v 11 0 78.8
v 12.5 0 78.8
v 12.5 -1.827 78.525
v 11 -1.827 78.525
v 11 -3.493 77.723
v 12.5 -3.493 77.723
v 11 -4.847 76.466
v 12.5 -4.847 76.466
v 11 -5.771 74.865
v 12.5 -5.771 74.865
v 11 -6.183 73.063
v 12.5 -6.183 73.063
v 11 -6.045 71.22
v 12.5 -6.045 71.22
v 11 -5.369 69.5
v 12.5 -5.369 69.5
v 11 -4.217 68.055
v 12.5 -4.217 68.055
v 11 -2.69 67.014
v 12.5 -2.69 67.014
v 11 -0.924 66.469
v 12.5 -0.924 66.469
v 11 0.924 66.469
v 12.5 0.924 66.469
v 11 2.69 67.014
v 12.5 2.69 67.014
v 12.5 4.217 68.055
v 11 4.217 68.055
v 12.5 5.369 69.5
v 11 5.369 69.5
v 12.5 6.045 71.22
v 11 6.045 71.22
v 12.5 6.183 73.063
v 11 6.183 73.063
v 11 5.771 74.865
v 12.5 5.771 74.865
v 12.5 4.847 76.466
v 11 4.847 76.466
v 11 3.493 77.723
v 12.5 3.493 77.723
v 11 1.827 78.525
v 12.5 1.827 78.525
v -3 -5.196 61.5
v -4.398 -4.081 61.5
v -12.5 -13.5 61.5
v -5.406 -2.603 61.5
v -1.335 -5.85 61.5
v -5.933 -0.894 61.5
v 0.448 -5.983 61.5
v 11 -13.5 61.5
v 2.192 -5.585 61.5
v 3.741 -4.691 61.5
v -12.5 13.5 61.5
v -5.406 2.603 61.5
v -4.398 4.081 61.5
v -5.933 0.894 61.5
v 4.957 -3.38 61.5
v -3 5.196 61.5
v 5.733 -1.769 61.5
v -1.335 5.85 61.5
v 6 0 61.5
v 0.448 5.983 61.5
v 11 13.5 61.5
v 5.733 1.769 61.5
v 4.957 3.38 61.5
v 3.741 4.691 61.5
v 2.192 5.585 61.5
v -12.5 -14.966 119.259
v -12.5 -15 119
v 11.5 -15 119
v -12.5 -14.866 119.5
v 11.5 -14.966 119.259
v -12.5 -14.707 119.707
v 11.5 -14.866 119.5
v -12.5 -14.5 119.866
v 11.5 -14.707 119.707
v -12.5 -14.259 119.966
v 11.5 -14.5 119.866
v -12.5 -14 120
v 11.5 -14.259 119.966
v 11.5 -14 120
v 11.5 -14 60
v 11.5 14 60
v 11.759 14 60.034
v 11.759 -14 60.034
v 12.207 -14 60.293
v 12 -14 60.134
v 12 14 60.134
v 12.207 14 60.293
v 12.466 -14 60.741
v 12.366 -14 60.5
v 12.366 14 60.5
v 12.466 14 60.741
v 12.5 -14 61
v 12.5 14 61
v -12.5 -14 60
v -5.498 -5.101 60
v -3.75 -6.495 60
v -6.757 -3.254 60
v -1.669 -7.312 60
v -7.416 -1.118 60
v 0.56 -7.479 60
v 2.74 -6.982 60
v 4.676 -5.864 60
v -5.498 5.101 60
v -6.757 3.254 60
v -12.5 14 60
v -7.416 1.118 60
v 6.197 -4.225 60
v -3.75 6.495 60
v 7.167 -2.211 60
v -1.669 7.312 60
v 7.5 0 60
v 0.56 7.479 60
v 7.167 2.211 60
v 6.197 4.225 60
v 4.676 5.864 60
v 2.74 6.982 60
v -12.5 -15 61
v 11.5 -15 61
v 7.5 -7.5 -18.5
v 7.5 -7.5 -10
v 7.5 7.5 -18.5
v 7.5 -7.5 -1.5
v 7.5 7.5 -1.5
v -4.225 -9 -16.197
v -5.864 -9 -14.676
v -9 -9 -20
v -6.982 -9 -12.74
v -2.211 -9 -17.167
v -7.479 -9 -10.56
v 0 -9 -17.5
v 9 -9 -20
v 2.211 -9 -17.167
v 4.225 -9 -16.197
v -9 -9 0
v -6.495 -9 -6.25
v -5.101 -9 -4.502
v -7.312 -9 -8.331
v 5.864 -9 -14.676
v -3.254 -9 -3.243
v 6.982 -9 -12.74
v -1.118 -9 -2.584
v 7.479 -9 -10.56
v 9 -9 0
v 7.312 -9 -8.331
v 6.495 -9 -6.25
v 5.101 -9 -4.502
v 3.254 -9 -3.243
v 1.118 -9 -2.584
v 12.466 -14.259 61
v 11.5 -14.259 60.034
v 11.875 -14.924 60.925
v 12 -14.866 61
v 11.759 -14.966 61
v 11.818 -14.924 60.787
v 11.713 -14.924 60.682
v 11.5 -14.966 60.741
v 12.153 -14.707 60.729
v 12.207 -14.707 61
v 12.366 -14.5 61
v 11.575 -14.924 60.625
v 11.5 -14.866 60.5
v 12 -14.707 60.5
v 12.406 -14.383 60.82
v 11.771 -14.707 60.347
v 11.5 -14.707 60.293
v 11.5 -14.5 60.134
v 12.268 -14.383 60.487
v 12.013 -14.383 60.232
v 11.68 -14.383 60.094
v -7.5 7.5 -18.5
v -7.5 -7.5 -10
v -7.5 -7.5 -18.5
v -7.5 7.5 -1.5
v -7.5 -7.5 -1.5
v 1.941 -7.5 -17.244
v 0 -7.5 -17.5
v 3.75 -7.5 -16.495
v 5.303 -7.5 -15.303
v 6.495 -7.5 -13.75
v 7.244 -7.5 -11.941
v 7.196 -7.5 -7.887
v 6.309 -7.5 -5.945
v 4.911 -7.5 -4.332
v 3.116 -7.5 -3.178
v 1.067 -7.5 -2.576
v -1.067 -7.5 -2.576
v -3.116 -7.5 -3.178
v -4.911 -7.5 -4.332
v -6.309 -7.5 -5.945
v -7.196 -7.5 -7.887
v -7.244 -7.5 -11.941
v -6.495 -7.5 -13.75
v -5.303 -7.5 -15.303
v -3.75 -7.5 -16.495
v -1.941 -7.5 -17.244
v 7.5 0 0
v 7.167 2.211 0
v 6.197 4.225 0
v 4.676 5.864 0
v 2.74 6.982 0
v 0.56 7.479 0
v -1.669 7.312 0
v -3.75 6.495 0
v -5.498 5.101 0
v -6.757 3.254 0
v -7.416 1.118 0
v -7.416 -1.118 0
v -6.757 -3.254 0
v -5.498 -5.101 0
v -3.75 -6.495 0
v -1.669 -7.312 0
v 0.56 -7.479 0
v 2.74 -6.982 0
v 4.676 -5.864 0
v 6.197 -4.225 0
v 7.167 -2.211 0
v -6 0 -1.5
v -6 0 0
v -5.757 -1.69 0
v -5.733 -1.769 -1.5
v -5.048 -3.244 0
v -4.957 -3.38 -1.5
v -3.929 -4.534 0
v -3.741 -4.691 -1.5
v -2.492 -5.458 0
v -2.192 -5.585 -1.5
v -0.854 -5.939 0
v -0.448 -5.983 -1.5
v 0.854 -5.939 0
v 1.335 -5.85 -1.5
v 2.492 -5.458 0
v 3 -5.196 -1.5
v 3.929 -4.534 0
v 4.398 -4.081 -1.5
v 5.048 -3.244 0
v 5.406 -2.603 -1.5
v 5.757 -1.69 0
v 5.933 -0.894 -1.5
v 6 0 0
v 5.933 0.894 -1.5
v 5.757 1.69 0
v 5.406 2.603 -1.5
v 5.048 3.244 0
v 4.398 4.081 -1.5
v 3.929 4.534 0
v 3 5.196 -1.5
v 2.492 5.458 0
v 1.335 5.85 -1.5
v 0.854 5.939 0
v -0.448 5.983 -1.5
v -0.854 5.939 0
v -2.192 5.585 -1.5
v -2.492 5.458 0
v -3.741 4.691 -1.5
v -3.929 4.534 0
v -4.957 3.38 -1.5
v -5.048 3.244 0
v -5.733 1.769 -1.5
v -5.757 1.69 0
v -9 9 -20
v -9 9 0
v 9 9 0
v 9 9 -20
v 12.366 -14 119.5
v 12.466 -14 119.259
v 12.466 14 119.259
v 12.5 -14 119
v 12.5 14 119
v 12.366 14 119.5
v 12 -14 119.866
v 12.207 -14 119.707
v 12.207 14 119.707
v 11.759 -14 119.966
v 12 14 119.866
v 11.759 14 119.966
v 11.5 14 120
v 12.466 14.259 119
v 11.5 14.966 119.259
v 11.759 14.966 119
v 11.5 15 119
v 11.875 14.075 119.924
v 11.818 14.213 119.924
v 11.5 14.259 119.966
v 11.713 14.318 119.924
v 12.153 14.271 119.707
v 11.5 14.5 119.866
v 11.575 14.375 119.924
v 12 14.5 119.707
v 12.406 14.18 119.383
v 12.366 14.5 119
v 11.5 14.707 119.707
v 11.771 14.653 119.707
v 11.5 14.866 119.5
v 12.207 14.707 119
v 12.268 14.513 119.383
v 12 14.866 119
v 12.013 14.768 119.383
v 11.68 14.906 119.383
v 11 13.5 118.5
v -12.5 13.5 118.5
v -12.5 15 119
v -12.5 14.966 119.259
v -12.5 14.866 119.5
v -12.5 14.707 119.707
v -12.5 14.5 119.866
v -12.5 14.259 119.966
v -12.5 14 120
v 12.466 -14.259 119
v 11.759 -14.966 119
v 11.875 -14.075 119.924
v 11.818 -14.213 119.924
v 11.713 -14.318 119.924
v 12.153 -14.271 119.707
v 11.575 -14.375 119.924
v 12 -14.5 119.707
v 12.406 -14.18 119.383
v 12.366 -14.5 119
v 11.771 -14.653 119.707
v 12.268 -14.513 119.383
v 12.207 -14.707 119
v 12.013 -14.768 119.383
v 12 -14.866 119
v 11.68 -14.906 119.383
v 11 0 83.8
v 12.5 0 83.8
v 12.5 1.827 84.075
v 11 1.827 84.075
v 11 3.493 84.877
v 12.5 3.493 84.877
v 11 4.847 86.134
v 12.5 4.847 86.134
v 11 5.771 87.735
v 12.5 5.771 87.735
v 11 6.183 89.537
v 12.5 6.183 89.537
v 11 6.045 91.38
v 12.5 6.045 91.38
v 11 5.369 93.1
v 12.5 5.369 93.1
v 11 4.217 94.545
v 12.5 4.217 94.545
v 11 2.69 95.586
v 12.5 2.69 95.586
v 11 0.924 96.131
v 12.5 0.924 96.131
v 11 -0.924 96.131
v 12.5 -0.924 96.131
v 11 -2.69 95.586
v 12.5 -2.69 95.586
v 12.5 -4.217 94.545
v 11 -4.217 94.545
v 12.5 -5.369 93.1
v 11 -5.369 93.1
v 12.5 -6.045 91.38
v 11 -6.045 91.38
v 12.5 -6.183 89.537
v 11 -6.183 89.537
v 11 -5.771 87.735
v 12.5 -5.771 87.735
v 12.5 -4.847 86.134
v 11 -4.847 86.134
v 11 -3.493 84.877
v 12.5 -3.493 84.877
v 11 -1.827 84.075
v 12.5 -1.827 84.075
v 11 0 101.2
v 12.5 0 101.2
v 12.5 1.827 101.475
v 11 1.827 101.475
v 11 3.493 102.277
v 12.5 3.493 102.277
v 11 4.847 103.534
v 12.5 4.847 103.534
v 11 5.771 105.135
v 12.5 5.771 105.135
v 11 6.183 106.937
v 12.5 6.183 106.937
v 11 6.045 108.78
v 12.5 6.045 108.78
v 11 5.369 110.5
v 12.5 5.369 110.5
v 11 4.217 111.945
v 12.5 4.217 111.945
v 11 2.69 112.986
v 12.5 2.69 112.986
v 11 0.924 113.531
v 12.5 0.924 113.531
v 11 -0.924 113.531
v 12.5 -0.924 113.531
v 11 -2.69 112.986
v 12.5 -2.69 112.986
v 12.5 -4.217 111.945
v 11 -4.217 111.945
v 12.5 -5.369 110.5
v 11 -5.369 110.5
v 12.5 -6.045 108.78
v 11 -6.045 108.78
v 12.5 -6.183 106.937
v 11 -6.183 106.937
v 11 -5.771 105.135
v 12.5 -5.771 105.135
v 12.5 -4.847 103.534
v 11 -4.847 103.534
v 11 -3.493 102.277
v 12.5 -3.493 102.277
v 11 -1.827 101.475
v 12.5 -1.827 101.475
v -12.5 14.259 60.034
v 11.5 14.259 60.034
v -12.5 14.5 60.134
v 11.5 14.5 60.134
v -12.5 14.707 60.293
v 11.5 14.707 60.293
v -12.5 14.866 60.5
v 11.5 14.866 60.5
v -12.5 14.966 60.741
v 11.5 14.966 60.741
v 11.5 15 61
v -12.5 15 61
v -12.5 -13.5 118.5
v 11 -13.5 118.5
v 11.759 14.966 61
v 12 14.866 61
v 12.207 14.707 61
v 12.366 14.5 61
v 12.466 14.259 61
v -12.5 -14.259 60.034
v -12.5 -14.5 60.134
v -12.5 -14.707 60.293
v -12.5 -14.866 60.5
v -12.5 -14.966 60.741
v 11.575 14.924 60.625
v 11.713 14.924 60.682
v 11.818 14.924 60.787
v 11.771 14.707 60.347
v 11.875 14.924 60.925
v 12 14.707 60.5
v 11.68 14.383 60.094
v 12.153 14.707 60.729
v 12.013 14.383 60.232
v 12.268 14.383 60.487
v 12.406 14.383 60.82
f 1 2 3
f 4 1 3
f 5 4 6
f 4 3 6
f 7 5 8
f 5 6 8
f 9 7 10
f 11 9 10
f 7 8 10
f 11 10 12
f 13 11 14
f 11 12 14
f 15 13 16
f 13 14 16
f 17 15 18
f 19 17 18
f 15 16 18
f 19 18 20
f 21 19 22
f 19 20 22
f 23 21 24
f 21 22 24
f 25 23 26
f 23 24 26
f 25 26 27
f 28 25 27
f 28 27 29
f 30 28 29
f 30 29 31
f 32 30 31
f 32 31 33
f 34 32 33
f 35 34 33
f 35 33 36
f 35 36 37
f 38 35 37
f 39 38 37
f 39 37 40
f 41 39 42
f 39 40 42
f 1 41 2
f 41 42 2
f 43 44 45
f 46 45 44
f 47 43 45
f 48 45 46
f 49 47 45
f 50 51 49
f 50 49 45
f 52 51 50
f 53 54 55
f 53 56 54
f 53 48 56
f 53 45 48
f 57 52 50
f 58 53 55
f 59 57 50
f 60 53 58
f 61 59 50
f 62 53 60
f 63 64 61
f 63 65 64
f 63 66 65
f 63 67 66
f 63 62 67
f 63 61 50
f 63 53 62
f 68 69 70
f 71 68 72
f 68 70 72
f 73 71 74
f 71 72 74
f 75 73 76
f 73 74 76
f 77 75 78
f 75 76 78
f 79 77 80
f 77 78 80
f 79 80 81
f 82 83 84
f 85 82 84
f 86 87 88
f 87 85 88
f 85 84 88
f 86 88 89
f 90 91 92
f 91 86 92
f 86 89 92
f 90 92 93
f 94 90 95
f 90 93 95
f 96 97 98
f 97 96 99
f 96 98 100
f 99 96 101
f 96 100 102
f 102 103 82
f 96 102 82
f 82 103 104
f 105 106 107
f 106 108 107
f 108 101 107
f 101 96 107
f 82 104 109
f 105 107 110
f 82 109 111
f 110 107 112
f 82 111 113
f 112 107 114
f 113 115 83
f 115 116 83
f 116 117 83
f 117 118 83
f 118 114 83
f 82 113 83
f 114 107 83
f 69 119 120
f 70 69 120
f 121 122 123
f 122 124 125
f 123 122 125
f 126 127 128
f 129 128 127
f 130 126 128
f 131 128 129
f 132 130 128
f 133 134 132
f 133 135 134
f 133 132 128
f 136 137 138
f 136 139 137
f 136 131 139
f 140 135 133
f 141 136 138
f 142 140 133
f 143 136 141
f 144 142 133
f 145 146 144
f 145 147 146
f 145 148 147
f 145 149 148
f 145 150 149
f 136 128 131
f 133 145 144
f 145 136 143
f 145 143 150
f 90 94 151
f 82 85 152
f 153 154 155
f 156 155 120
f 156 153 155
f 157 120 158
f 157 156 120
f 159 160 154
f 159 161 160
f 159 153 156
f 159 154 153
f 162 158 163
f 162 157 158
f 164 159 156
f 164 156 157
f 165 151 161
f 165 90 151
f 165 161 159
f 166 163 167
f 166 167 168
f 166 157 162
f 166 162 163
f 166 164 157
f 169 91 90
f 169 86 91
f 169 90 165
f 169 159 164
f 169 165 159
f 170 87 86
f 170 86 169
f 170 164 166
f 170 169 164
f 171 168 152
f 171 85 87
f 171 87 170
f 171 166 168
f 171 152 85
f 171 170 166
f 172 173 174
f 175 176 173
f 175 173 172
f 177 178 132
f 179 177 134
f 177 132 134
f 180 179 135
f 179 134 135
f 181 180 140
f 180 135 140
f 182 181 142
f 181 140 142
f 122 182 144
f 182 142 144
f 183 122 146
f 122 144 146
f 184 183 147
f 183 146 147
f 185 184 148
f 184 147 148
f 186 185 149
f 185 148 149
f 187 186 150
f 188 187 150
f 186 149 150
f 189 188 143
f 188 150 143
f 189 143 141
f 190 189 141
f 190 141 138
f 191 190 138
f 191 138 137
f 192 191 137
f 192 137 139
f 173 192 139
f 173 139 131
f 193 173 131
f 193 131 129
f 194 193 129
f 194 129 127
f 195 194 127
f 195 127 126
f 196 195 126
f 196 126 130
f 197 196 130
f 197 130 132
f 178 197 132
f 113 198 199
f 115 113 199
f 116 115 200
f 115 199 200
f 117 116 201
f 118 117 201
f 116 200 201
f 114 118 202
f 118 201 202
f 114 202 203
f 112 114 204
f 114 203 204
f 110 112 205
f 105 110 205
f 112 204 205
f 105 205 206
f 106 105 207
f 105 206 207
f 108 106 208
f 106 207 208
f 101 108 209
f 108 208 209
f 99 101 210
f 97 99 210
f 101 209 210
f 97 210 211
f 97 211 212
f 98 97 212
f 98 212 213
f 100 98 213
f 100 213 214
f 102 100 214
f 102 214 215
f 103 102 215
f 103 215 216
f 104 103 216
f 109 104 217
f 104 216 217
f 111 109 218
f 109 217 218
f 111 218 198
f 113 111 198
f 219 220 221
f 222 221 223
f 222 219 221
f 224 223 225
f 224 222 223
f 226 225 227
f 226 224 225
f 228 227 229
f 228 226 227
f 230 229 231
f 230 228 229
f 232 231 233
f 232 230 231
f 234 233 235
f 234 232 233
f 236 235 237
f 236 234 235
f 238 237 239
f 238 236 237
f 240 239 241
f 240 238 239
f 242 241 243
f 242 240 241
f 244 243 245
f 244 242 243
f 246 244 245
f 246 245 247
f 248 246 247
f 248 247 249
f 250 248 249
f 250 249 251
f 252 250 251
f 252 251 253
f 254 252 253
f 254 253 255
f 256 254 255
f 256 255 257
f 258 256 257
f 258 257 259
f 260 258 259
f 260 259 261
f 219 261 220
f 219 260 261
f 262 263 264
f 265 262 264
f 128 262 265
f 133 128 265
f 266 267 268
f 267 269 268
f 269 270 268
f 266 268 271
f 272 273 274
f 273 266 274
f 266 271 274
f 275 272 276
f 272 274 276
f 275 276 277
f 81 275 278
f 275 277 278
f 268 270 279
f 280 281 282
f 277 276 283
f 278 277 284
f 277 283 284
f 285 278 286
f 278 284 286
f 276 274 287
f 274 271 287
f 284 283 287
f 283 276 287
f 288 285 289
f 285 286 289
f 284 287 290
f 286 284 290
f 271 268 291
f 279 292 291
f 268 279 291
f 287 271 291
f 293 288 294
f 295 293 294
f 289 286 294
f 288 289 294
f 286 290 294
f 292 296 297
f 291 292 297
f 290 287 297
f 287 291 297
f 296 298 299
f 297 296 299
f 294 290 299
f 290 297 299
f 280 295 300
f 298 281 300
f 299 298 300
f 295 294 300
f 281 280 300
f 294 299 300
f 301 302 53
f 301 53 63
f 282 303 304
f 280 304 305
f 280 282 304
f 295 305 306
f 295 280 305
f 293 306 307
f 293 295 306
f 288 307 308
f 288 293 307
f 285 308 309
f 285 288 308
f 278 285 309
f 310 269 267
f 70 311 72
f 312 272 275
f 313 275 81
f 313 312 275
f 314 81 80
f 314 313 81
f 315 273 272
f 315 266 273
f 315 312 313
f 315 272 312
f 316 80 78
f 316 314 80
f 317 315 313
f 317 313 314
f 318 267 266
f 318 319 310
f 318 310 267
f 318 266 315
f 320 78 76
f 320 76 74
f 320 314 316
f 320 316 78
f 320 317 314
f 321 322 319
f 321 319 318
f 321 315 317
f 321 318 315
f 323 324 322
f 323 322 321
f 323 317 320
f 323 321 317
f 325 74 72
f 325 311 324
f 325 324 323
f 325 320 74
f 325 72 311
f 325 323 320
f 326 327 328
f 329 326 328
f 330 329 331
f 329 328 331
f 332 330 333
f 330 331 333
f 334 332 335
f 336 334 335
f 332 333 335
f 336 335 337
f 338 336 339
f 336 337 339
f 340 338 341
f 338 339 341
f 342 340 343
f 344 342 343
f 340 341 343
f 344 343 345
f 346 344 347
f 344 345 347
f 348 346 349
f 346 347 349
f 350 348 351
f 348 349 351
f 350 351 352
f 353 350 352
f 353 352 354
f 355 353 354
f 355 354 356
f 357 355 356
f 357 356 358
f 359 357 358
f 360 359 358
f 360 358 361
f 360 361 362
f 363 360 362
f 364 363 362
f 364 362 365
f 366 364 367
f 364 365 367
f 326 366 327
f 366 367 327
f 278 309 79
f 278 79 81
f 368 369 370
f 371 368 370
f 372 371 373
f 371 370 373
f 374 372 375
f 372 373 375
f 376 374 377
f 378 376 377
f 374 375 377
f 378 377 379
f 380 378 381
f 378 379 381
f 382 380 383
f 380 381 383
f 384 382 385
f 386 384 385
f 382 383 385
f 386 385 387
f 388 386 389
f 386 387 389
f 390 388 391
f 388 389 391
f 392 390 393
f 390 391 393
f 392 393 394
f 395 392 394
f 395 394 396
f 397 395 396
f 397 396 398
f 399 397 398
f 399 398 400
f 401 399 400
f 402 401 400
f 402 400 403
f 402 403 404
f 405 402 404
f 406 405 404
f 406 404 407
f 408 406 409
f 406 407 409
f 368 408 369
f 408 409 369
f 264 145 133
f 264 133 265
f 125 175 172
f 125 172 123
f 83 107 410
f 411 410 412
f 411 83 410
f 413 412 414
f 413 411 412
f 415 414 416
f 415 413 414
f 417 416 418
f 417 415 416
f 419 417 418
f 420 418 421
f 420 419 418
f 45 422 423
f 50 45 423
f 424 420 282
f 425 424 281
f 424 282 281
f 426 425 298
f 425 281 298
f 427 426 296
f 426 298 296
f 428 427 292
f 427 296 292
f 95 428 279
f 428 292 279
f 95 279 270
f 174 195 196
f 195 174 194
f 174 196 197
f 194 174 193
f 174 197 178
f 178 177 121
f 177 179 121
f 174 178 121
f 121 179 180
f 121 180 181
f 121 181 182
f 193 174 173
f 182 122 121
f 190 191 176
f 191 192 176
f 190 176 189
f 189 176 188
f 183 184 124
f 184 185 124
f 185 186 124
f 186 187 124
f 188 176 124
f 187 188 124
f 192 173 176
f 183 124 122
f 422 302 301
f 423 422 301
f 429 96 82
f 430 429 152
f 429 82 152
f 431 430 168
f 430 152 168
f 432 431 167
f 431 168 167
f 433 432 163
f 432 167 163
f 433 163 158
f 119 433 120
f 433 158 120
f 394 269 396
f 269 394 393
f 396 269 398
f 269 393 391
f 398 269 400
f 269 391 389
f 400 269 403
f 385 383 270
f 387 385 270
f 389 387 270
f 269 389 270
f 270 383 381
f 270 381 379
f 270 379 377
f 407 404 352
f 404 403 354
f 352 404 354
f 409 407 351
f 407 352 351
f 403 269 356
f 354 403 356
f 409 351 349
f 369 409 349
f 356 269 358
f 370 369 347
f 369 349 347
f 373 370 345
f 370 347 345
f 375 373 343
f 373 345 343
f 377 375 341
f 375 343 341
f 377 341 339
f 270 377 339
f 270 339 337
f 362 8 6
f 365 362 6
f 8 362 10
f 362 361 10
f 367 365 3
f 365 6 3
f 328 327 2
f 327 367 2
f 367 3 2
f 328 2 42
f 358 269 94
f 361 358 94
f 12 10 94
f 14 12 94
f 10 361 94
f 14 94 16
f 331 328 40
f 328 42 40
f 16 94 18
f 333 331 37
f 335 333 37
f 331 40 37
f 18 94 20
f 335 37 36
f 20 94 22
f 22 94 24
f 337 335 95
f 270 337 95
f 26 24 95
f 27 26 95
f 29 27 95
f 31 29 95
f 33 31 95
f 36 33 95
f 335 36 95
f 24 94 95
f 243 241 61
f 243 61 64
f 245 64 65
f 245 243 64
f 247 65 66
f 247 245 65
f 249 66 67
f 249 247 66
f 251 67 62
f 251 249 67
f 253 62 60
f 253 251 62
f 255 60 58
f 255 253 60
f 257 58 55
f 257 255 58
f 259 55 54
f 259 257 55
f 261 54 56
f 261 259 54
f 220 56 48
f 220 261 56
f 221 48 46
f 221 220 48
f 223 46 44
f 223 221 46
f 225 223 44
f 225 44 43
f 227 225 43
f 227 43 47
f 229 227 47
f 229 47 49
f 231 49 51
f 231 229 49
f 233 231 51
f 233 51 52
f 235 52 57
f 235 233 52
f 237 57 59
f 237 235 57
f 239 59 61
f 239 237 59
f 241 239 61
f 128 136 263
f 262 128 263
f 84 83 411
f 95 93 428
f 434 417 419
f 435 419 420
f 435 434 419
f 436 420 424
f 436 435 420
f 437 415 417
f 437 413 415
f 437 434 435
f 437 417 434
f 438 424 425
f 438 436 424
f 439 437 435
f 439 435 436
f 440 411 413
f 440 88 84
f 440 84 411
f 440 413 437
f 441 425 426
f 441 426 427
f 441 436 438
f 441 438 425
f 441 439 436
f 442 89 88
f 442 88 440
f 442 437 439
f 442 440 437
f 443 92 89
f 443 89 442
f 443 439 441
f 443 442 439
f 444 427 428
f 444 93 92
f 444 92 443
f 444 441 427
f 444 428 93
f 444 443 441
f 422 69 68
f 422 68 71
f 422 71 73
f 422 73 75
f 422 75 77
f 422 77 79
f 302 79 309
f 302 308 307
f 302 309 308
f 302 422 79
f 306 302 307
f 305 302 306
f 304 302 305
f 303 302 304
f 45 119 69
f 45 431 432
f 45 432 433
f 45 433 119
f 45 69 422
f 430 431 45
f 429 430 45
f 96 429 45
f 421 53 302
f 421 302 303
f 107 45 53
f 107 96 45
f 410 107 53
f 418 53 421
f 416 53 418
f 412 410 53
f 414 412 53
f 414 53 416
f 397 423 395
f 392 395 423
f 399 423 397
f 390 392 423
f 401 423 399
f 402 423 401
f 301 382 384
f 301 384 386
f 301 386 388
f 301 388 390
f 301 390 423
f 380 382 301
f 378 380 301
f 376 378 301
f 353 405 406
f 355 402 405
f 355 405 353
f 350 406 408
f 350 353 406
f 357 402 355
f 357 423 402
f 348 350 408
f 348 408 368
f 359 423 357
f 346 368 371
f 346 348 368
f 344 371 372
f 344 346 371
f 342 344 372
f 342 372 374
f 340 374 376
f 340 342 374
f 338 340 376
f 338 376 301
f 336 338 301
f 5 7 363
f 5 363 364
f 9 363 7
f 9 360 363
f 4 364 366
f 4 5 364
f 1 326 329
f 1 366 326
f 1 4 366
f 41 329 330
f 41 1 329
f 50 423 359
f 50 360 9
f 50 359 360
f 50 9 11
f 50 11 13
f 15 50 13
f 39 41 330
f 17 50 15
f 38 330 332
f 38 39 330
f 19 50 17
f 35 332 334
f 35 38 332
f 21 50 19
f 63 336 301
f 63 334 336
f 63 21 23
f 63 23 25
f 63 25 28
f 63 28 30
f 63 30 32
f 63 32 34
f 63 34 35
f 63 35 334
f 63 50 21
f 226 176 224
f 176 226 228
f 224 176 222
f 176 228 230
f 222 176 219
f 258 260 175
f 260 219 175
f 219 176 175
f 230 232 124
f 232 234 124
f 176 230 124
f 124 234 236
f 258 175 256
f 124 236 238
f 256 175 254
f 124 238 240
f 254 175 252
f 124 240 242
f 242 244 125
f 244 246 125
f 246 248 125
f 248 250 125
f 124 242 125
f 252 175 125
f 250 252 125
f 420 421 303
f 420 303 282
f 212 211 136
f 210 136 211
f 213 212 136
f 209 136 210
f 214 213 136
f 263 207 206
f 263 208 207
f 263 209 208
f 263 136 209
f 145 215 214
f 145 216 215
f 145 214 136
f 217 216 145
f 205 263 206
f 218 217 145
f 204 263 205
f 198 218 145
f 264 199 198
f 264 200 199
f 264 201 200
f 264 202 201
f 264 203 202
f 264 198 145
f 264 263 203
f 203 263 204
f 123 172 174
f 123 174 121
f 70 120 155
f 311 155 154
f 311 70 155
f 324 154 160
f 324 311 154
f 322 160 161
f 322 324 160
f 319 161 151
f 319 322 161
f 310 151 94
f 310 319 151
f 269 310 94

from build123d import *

# Parameters (mm, degrees)
SKETCH_1_R          = 7.5
EXTRUDE_1_DEPTH     = 60
SHELL_3_T           = -1.5
SKETCH_4_W          = 25
SKETCH_4_H          = 30
EXTRUDE_4_DEPTH     = 60
SHELL_START         = 61.5
SHELL_4_OUTLINE_W   = 23.5
SHELL_4_OUTLINE_H   = 27
SHELL_4_DEPTH       = 57
SHELL_START_2       = 60
SHELL_4_2_OUTLINE_R = 6
SHELL_4_2_DEPTH     = 1.5
SKETCH_5_R          = 6.2
CUT_EXTRUDE_1_DEPTH = 1.5
SKETCH_18_W         = 18
SKETCH_18_H         = 18
EXTRUDE_10_DEPTH    = 20
SKETCH_19_W         = 15
SKETCH_19_H         = 15
CUT_EXTRUDE_5_DEPTH = 17
SKETCH_20_R         = 6
CUT_EXTRUDE_6_DEPTH = 1.5
SKETCH_22_R         = 7.5
CUT_EXTRUDE_7_DEPTH = 1.5
FILLET_5_R          = 1


# Read off the part's stored shape, not the designer's step: 抽壳4
with BuildPart() as part:
    # 草图1 → 凸台-拉伸1 (new body)
    with BuildSketch(Plane.XY):
        Circle(SKETCH_1_R)
    extrude(amount=EXTRUDE_1_DEPTH)

    # 抽壳3
    shell_3_openings = [part.faces().sort_by_distance(p)[0] for p in [
        (0, 0, 60),
        (0, 0, 0),
    ]]
    offset(amount=SHELL_3_T, openings=shell_3_openings, kind=Kind.INTERSECTION)

    # 草图4 → 凸台-拉伸4 (add)
    with BuildSketch(Plane.XY.offset(60)):
        Rectangle(SKETCH_4_W, SKETCH_4_H)
    extrude(amount=EXTRUDE_4_DEPTH)

    # 抽壳4 outline → 抽壳4 (cut)
    with BuildSketch(Plane.XY.offset(SHELL_START)):
        with Locations((-0.75, 0)):
            Rectangle(SHELL_4_OUTLINE_W, SHELL_4_OUTLINE_H)
    extrude(amount=SHELL_4_DEPTH, mode=Mode.SUBTRACT)

    # Shell 4 2 outline → Shell 4 2 (cut)
    with BuildSketch(Plane.XY.offset(SHELL_START_2)):
        Circle(SHELL_4_2_OUTLINE_R)
    extrude(amount=SHELL_4_2_DEPTH, mode=Mode.SUBTRACT)

    # 草图5 → 切除-拉伸1 (cut)
    with BuildSketch(Plane(origin=(12.5, 0, 0), x_dir=(0, 0, -1), z_dir=(1, 0, 0))):
        with Locations((-90, 0)):
            Circle(SKETCH_5_R)
        with Locations((-107.4, 0)):
            Circle(SKETCH_5_R)
        with Locations(Location((-72.6, 0, 0), (0, 0, 180))):
            Circle(SKETCH_5_R)
    extrude(amount=-CUT_EXTRUDE_1_DEPTH, mode=Mode.SUBTRACT)

    # 草图18 → 凸台-拉伸10 (add)
    with BuildSketch(Plane.XY):
        Rectangle(SKETCH_18_W, SKETCH_18_H)
    extrude(amount=-EXTRUDE_10_DEPTH)

    # 草图19 → 切除-拉伸5 (cut)
    with BuildSketch(Plane.XY.offset(-1.5)):
        Rectangle(SKETCH_19_W, SKETCH_19_H)
    extrude(amount=-CUT_EXTRUDE_5_DEPTH, mode=Mode.SUBTRACT)

    # 草图20 → 切除-拉伸6 (cut)
    with BuildSketch(Plane.XY.offset(-1.5)):
        with Locations(Location((0, 0, 0), (0, 0, 180))):
            Circle(SKETCH_20_R)
    extrude(amount=CUT_EXTRUDE_6_DEPTH, mode=Mode.SUBTRACT)

    # 草图22 → 切除-拉伸7 (cut)
    with BuildSketch(Plane(origin=(0, -9, 0), x_dir=(-1, 0, 0), z_dir=(0, -1, 0))):
        with Locations(Location((0, 10, 0), (0, 0, 90))):
            Circle(SKETCH_22_R)
    extrude(amount=-CUT_EXTRUDE_7_DEPTH, mode=Mode.SUBTRACT)

    # 圆角5
    fillet_5_edges = [part.edges().sort_by_distance(p)[0] for p in [
        (12.5, 0, 60),
        (12.5, -15, 90),
        (0, 15, 60),
        (12.5, 15, 90),
        (0, -15, 60),
        (12.5, 0, 120),
        (0, 15, 120),
        (0, -15, 120),
    ]]
    fillet(fillet_5_edges, radius=FILLET_5_R)


solid = part.part
